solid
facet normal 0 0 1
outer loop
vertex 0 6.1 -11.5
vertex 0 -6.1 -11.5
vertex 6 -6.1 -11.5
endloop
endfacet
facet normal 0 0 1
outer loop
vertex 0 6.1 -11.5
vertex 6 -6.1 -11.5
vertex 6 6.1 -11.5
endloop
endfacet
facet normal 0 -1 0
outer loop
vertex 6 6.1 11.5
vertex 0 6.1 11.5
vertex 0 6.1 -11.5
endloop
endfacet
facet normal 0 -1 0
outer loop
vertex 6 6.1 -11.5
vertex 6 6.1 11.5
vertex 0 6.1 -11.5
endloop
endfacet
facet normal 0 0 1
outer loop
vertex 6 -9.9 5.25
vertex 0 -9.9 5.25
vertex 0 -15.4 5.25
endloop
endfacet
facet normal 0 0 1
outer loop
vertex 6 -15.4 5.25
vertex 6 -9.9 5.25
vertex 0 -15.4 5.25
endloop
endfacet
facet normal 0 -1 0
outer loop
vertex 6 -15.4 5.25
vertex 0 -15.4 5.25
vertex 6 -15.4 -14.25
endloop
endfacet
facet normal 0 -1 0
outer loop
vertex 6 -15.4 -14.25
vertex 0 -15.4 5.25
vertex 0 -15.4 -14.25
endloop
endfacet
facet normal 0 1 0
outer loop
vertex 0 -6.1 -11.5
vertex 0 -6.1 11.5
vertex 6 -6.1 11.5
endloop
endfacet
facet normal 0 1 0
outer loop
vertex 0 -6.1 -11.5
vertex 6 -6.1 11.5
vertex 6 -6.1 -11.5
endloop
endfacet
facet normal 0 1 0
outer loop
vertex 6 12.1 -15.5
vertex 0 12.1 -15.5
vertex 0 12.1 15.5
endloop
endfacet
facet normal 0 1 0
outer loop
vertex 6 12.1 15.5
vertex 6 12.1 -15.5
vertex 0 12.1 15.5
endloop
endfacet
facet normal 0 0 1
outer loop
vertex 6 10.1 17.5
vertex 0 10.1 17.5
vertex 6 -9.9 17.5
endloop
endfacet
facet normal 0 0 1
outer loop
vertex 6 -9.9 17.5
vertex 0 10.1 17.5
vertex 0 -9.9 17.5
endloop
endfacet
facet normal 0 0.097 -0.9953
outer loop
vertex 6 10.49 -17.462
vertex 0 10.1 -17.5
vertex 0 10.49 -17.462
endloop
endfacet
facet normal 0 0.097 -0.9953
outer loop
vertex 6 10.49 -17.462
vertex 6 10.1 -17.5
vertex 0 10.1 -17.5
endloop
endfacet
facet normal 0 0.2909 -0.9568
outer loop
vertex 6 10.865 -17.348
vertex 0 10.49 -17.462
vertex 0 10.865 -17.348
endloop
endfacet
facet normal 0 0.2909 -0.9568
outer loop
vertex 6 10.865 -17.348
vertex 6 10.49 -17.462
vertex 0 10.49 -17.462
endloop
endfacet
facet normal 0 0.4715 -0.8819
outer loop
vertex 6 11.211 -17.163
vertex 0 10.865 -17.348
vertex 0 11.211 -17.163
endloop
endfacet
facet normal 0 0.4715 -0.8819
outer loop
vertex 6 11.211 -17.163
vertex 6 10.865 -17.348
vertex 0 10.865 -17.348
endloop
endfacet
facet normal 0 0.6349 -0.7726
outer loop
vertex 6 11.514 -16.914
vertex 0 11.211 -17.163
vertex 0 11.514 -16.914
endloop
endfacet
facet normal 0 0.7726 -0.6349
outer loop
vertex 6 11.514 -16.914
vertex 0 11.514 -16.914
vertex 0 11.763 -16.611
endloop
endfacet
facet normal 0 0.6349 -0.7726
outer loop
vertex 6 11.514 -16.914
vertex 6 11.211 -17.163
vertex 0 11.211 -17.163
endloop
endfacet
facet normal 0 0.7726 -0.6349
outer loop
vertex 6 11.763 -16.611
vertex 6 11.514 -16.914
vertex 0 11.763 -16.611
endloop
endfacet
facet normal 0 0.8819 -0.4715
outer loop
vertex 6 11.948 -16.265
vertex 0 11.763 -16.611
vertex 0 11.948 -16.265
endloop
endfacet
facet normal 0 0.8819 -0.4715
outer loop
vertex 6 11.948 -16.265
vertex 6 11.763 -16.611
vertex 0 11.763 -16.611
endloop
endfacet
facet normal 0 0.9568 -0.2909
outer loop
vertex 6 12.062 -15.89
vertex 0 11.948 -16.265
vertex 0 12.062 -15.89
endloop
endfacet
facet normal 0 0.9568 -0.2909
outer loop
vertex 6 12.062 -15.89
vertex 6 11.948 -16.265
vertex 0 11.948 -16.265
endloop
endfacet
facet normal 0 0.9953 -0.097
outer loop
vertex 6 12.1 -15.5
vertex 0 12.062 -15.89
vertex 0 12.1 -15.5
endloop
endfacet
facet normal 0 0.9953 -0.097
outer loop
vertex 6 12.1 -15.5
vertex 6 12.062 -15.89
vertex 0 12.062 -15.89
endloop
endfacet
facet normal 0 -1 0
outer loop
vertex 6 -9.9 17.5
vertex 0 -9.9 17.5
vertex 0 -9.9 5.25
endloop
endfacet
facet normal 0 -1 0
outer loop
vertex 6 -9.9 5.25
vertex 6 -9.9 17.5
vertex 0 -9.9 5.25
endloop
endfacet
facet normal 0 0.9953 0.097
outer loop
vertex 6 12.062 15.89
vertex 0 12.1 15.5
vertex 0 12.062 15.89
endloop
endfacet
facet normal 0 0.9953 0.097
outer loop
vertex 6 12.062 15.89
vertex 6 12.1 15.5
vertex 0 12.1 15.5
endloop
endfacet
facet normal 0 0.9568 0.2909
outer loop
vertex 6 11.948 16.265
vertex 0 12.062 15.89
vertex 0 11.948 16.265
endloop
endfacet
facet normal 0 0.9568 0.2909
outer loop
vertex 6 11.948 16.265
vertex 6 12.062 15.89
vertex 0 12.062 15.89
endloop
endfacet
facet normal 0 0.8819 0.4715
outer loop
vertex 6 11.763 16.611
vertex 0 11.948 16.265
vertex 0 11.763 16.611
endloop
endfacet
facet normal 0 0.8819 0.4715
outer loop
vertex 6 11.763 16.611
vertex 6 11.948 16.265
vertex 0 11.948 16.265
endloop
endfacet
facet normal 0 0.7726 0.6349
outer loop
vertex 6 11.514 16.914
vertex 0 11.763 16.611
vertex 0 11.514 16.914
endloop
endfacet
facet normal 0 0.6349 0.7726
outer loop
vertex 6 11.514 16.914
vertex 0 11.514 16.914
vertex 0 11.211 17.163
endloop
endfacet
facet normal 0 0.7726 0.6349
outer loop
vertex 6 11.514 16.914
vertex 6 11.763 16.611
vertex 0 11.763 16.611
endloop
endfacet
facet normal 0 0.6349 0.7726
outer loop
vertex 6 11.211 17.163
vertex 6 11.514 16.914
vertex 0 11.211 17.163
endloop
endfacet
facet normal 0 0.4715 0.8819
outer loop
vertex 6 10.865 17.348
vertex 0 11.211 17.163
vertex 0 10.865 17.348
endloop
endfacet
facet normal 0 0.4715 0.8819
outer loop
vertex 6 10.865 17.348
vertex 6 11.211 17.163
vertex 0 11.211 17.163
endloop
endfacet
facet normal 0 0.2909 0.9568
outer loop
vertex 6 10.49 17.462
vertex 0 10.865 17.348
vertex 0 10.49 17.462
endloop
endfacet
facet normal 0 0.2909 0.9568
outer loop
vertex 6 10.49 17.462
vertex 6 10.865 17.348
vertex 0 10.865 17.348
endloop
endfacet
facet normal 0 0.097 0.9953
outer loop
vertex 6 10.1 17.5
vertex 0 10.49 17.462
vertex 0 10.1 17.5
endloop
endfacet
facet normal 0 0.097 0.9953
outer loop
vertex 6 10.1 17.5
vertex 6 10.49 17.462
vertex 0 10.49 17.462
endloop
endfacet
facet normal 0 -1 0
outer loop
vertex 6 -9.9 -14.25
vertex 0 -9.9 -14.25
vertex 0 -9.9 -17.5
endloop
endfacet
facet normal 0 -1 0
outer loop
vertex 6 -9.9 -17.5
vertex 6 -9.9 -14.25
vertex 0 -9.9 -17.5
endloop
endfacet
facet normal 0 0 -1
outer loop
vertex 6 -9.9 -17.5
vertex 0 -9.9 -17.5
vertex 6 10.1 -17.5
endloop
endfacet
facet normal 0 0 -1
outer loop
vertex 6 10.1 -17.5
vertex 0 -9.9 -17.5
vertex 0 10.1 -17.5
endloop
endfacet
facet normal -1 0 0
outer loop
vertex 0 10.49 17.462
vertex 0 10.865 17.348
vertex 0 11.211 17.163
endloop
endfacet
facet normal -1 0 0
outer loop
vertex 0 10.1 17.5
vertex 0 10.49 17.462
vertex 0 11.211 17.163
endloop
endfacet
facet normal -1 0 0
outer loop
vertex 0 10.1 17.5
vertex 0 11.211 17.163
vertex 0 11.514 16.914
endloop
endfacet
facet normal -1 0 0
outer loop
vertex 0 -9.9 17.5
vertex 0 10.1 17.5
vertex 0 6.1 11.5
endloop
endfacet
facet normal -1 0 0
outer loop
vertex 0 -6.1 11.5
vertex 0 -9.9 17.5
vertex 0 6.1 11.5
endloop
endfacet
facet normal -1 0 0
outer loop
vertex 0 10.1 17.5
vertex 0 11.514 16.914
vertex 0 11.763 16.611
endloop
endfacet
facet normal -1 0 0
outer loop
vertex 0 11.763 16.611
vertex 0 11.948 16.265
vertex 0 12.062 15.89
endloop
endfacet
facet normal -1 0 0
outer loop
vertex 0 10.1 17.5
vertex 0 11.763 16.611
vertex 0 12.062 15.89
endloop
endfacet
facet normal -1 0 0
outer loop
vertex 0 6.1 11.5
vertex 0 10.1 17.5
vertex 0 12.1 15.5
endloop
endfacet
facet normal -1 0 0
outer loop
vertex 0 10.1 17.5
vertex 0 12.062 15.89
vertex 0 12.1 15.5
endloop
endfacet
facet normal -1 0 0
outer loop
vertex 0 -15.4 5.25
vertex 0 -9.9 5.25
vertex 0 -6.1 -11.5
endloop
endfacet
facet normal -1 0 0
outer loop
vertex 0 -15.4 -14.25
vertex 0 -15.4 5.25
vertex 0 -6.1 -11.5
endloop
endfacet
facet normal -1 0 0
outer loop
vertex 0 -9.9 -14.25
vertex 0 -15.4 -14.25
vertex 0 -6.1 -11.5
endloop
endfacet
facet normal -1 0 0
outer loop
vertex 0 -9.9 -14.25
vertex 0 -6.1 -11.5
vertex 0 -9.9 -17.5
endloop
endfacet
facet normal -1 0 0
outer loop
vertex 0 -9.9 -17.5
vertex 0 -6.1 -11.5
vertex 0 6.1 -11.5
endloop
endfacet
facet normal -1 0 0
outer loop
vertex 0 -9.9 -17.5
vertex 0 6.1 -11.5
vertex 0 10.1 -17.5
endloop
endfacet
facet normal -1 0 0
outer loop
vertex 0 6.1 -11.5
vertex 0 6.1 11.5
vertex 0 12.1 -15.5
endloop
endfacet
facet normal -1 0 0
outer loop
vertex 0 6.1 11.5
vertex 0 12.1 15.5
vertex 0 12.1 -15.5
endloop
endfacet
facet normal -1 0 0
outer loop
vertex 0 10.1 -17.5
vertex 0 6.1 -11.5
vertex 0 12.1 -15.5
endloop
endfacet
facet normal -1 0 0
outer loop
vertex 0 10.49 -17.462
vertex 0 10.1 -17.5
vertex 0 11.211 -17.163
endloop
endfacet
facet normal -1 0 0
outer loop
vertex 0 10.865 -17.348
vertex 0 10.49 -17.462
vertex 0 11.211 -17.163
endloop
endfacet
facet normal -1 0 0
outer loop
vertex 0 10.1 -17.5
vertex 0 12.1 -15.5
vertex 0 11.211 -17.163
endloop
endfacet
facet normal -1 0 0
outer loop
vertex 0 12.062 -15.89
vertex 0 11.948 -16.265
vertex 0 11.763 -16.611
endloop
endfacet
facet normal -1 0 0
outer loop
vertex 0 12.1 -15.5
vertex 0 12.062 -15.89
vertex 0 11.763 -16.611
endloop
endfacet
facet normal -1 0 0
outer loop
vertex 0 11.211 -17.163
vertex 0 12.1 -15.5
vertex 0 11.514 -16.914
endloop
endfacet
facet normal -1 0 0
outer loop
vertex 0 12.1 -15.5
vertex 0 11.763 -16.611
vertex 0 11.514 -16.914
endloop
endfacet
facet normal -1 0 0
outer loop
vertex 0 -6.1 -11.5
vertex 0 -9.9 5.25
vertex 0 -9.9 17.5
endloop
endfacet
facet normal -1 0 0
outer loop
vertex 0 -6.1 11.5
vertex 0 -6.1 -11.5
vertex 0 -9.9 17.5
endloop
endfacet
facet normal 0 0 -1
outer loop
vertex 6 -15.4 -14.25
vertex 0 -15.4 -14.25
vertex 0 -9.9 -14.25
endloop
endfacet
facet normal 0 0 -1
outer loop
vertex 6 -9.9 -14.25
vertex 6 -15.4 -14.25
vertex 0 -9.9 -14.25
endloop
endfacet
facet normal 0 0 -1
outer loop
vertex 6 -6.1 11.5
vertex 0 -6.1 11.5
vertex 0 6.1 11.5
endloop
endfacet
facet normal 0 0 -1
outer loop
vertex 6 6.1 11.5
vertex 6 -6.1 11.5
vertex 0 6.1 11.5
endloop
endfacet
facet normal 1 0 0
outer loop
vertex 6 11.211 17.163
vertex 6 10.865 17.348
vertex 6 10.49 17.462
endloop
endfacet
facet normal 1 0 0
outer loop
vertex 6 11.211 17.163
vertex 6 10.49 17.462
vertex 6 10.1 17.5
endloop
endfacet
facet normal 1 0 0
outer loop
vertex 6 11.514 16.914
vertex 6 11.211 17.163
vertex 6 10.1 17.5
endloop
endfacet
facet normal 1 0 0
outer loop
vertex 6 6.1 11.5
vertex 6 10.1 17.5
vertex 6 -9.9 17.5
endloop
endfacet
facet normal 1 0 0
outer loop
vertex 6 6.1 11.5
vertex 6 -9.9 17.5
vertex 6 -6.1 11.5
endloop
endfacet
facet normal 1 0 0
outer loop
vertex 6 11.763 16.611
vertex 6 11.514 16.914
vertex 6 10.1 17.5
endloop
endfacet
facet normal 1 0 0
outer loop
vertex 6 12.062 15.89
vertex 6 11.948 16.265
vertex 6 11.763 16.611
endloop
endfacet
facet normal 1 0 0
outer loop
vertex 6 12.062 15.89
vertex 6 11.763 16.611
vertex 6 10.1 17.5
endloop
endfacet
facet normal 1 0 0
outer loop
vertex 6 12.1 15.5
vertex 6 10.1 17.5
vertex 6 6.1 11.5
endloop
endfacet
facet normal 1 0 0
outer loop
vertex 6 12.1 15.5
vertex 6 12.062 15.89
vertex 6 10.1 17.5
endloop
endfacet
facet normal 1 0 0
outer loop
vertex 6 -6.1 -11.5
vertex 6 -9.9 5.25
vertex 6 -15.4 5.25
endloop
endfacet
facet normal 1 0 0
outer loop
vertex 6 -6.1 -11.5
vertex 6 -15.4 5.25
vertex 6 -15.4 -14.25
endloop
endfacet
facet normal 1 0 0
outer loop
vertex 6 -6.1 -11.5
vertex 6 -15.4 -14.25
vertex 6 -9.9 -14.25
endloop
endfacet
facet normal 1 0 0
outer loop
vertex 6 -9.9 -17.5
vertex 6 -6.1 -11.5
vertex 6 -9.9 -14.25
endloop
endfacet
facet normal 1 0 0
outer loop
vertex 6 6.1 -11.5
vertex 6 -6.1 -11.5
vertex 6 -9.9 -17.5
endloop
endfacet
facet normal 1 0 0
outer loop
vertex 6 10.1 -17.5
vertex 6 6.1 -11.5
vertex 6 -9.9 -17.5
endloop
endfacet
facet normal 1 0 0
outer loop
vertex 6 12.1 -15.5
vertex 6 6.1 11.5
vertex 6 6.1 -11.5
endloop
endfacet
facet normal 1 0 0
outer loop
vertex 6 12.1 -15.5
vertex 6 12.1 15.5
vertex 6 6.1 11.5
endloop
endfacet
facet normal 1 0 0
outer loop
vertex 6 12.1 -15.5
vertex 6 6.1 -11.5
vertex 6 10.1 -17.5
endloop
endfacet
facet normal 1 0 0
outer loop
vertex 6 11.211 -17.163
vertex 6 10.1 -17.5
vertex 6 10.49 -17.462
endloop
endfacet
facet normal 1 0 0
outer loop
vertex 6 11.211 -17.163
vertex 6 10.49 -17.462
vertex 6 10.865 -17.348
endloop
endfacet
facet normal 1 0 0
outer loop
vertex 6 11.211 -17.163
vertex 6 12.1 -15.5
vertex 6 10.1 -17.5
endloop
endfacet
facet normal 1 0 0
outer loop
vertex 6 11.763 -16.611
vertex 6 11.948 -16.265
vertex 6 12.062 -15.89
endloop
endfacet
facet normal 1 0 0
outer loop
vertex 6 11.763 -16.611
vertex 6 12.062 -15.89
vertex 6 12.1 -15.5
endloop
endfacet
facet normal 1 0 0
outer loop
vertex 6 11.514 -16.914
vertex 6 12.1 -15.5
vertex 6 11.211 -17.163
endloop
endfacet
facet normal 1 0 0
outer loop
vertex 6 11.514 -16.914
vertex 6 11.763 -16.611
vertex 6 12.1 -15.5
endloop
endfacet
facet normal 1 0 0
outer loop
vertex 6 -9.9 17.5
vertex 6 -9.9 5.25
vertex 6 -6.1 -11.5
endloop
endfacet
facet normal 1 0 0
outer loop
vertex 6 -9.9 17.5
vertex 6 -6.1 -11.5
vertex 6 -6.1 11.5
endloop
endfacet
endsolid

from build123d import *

# Parameters (mm, degrees)
SKETCH1_W           = 23
SKETCH1_H           = 12.2
BOSS_EXTRUDE1_DEPTH = 6
FILLET1_R           = 2


with BuildPart() as part:
    # Sketch1 → Boss-Extrude1 (new body)
    with BuildSketch(Plane(origin=(0, 0, 0), x_dir=(0, 0, -1), z_dir=(1, 0, 0))):
        Polygon((17.5, -9.9), (17.5, 12.1), (-17.5, 12.1), (-17.5, -9.9), (-5.25, -9.9), (-5.25, -15.4), (14.25, -15.4), (14.25, -9.9), align=None)
        Rectangle(SKETCH1_W, SKETCH1_H, mode=Mode.SUBTRACT)
    extrude(amount=BOSS_EXTRUDE1_DEPTH)

    # Fillet1
    fillet1_edges = [part.edges().sort_by_distance(p)[0] for p in [
        (3, 12.1, -17.5),
        (3, 12.1, 17.5),
    ]]
    fillet(fillet1_edges, radius=FILLET1_R)


solid = part.part
